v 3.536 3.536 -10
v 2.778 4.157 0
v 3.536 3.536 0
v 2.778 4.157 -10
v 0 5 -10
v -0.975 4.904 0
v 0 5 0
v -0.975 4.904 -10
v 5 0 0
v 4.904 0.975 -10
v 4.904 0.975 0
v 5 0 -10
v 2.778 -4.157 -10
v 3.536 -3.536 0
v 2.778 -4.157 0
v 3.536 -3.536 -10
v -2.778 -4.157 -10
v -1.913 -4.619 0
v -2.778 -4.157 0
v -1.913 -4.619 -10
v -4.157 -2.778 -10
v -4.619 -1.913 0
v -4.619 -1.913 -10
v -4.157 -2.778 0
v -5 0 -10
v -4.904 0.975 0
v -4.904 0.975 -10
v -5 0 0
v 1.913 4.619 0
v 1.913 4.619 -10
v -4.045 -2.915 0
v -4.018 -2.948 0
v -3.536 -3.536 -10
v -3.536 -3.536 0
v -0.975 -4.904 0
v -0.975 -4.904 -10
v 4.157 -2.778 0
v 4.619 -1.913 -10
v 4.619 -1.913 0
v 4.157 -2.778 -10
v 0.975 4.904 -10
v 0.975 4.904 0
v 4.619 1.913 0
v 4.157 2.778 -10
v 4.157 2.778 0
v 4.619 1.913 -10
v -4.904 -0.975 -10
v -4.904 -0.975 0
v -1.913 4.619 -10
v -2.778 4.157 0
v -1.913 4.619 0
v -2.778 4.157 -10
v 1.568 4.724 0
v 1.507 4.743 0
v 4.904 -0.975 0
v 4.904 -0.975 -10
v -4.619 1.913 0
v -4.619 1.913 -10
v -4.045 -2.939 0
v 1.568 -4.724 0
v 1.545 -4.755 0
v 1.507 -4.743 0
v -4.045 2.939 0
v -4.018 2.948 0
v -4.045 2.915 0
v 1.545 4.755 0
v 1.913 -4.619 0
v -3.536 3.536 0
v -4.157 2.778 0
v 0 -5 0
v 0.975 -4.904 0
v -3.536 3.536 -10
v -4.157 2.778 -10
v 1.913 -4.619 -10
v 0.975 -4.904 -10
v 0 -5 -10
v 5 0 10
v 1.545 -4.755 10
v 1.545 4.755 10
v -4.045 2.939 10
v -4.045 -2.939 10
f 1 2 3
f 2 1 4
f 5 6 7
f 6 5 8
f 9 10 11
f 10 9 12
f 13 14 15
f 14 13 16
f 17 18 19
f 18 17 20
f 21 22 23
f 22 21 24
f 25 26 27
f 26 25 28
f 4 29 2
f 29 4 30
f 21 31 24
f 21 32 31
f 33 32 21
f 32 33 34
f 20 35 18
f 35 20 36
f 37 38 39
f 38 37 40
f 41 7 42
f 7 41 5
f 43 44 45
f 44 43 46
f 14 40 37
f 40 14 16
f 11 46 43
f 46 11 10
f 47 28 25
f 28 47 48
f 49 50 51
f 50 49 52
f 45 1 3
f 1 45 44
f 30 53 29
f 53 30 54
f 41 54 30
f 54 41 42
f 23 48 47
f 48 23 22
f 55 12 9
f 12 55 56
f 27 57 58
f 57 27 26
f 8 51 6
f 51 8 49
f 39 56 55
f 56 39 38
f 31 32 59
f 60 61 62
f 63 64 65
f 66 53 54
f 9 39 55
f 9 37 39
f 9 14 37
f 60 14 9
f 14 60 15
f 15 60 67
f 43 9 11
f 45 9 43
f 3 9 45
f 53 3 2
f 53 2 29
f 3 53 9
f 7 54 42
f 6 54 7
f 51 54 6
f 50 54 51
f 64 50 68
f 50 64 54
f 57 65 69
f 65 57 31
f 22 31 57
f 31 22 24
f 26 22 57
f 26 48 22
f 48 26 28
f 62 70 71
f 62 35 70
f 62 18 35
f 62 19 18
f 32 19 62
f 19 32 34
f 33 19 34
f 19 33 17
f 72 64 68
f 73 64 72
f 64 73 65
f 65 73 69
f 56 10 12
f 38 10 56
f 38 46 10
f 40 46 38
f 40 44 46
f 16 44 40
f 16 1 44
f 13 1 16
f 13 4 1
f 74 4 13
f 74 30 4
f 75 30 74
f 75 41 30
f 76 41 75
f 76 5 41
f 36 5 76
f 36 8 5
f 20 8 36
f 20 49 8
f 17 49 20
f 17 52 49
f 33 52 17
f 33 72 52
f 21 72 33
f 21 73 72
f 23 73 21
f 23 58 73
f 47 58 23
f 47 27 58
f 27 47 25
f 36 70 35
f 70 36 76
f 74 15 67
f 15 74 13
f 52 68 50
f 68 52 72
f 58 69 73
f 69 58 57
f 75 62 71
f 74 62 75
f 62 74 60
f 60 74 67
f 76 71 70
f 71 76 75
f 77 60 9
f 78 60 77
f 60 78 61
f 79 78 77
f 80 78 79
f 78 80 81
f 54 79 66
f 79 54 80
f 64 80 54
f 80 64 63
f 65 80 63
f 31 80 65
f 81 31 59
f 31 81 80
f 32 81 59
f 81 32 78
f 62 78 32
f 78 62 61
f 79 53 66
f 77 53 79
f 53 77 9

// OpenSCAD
// file: lib.scad
$fn = 32;

kEpsilon = 1e-1;

function property(table, key) = table[search([key], table)[0]][1];

module sector(radius, angles, fn = $fn) {
     r = radius / cos(180 / fn);
     step = -360 / fn;

     points = concat([[0, 0]],
                     [for(a = [angles[0] : step : angles[1] - 360])
                               [r * cos(a), r * sin(a)]
                          ],
                     [[r * cos(angles[1]), r * sin(angles[1])]]
          );

     difference() {
          circle(radius, $fn = fn);
          polygon(points);
     }
}

module ring(inner_radius, outer_radius, angles = [0, 360], fn = $fn) {
     difference() {
          sector(radius=outer_radius, angles=angles, fn=fn);
          sector(radius=inner_radius, angles=angles+[-kEpsilon, kEpsilon], fn=fn);
     }
}

module rounded_ring(inner_radius, outer_radius, angles = [0, 360], fn = $fn) {
     step_angle = 360 / fn;
     ring_width = outer_radius - inner_radius;
     ring_mean_radius = (outer_radius + inner_radius) / 2;
     for (theta = angles) {
          theta_d = theta / step_angle;
          theta_frac = (theta_d - floor(theta_d) - 0.5) * step_angle;
          rho = ring_mean_radius * cos(step_angle/2) / cos(theta_frac);
          rotate(theta)
          translate([rho, 0])
          circle(d=ring_width);
     }
     ring(inner_radius=inner_radius,
          outer_radius=outer_radius,
          angles=angles, fn=fn);
}

module fillet(r) {
     difference() {
          difference() {
               offset(r=-r - kEpsilon)
                    offset(delta=r) {
                    children();
               }
               offset(r=r)
                    offset(delta=-r) {
                    children();
               }
          }
          children();
     }
     offset(r=r)
          offset(delta=-r) {
          children();
     }
}

module bench_fillet(r, order=1000) {
     difference() {
          fillet(r) {
               translate([-order/2-kEpsilon, 0]) {
                    square([order, order], center=true);
               }
               children();
          }
          translate([-order/2-kEpsilon, 0]) {
               square([order+kEpsilon, order+kEpsilon], center=true);
          }
     }
}

module curved_bench_fillet(r, bench_radius, order=1000, internal=true) {
     difference() {
          fillet(r) {
               if (internal) {
                    translate([bench_radius, 0]) {
                         ring(inner_radius=bench_radius + kEpsilon, outer_radius=bench_radius * order);
                    }
               } else {
                    translate([-bench_radius, 0]) circle(r=bench_radius - kEpsilon);
               }
               children();
          }
          if (internal) {
               translate([bench_radius, 0]) {
                    ring(inner_radius=bench_radius,
                         outer_radius=bench_radius * order - kEpsilon);
               }
          } else {
               translate([-bench_radius, 0]) circle(r=bench_radius);
          }

     }
}


module window(side, position=[0, 0, 0], order=1000) {
    difference() {
        children();
        translate(position)  {
            difference() {
                square(order, center=true);
                square(side, center=true);
            }
        }
    }
}


module rounded_cylinder(diameter, height, fillet_radius, center) {
     translate([0, 0, ! center ? height/2 : 0]) {
          minkowski() {
               cylinder(d=(diameter - 2 * fillet_radius),
                        h=(height - 2 * fillet_radius),
                        center=true);
               sphere(r=fillet_radius);
          }
     }
}


module curved_support_xsection(support_radius, fillet_radius,
                               wall_inner_radius, wall_outer_radius,
                               hole_radius = 0, internal=true) {
     support_angular_width = (4 * support_radius / wall_outer_radius) * 180 / PI;
     wall_thickness = wall_outer_radius - wall_inner_radius;
     rotate([0, 0, internal ? 180 : 0]) {
          difference() {
               window(6*support_radius) {
                    curved_bench_fillet(fillet_radius, bench_radius=wall_inner_radius, internal=internal) {
                         hull() {
                              translate([support_radius + wall_thickness/2, 0]) {
                                   circle(r=support_radius);
                              }
                              rotate([0, 0, ! internal ? 180 : 0])
                              translate([wall_inner_radius + wall_thickness/2, 0]) {
                                   ring(inner_radius=wall_inner_radius,
                                        outer_radius=wall_outer_radius,
                                        angles=[180 - support_angular_width/2,
                                                180 + support_angular_width/2]);
                              }
                         }
                         rotate([0, 0, ! internal ? 180 : 0])
                         translate([wall_inner_radius + wall_thickness/2, 0]) {
                              ring(inner_radius=wall_inner_radius,
                                   outer_radius=wall_outer_radius,
                                   angles=[180 - support_angular_width,
                                           180 + support_angular_width]);
                         }
                    }
               }
               if (hole_radius > 0) {
                    translate([support_radius + wall_thickness/2, 0]) {
                         circle(r=hole_radius);
                    }
               }
          }
     }
}

module fill(upto=1000) {
     offset(delta=-upto) {
          offset(delta=upto) {
               children();
          }
     }
}

module outline(delta) {
     if (delta > 0) {
          difference() {
               offset(delta=delta) {
                    children();
               }
               children();
          }
     } else {
          difference() {
               children();
               offset(delta=delta) {
                    children();
               }
          }
     }
}

module duplicate(v) {
     children();
     mirror(v) children();
}

function steps(start, end, n) = [start:(end - start)/(n - 1):end];

function sigmoid(x) = 1.0 / (1.0 + exp(-x));

module sigmoid_profile(length, width, order=10, fn = $fn) {
     step = length / fn;
     points = concat(
          [[0, 0]],
          [for (x = [step:step:length-step]) [x, width * sigmoid(2 * order * ((x / length) - 0.5))]],
          [[length, width], [0, width]]

     );
     polygon(points=points);
}

module exp_nerve_xsection(height, length, decay_rate = 5, fn = $fn) {
     step = length / fn;
     points = concat(
          [[0, 0]],
          [for (x = [0:step:length-step]) [x, height * exp(-x/decay_rate)]],
          [[length, 0]]
          );
     polygon(points=points);
}

module exp_nerve(height, length, thickness, decay_rate = 3, fn = $fn) {
     rotate([90, 0, 0])
     linear_extrude(height=thickness, center=true) {
          exp_nerve_xsection(height, length, decay_rate, fn);
     }
}

module exp_corner_nerve(height, radius, angles, corner_radius = 0, decay_rate = 3, fn = $fn) {
     difference() {
          rotate_extrude() {
               if (corner_radius > 0) {
                    translate([corner_radius, 0, 0])
                    exp_nerve_xsection(height=height, length=radius, decay_rate=decay_rate, fn=fn);
               } else {
                    translate([-corner_radius, 0, 0])
                    mirror([1, 0, 0])
                    exp_nerve_xsection(height=height, length=radius, decay_rate=decay_rate, fn=fn);
               }
          }
          linear_extrude(height=2 * height, center=true) {
               sector(radius=radius + abs(corner_radius), angles=[angles[1], angles[0] + 360], fn=fn);
          }
     }
}
// main file
include <lib.scad>;

function pvShaftDatasheet(length, diameter) =
     [["length", length], ["diameter", diameter]];


module pmShaft(datasheet) {
     linear_extrude(height=property(datasheet, "length")) {
          scale(property(datasheet, "diameter")) {
               if ($children > 0) {
                    children();
               } else {
                    circle(d=1);
               }
          }
     }
}


datasheet = pvShaftDatasheet(length=10, diameter=10);
rotate([180, 0 ,0]) {
     pmShaft(datasheet);
}
pmShaft(datasheet) {
     circle(d=1, $fn=5);
}
